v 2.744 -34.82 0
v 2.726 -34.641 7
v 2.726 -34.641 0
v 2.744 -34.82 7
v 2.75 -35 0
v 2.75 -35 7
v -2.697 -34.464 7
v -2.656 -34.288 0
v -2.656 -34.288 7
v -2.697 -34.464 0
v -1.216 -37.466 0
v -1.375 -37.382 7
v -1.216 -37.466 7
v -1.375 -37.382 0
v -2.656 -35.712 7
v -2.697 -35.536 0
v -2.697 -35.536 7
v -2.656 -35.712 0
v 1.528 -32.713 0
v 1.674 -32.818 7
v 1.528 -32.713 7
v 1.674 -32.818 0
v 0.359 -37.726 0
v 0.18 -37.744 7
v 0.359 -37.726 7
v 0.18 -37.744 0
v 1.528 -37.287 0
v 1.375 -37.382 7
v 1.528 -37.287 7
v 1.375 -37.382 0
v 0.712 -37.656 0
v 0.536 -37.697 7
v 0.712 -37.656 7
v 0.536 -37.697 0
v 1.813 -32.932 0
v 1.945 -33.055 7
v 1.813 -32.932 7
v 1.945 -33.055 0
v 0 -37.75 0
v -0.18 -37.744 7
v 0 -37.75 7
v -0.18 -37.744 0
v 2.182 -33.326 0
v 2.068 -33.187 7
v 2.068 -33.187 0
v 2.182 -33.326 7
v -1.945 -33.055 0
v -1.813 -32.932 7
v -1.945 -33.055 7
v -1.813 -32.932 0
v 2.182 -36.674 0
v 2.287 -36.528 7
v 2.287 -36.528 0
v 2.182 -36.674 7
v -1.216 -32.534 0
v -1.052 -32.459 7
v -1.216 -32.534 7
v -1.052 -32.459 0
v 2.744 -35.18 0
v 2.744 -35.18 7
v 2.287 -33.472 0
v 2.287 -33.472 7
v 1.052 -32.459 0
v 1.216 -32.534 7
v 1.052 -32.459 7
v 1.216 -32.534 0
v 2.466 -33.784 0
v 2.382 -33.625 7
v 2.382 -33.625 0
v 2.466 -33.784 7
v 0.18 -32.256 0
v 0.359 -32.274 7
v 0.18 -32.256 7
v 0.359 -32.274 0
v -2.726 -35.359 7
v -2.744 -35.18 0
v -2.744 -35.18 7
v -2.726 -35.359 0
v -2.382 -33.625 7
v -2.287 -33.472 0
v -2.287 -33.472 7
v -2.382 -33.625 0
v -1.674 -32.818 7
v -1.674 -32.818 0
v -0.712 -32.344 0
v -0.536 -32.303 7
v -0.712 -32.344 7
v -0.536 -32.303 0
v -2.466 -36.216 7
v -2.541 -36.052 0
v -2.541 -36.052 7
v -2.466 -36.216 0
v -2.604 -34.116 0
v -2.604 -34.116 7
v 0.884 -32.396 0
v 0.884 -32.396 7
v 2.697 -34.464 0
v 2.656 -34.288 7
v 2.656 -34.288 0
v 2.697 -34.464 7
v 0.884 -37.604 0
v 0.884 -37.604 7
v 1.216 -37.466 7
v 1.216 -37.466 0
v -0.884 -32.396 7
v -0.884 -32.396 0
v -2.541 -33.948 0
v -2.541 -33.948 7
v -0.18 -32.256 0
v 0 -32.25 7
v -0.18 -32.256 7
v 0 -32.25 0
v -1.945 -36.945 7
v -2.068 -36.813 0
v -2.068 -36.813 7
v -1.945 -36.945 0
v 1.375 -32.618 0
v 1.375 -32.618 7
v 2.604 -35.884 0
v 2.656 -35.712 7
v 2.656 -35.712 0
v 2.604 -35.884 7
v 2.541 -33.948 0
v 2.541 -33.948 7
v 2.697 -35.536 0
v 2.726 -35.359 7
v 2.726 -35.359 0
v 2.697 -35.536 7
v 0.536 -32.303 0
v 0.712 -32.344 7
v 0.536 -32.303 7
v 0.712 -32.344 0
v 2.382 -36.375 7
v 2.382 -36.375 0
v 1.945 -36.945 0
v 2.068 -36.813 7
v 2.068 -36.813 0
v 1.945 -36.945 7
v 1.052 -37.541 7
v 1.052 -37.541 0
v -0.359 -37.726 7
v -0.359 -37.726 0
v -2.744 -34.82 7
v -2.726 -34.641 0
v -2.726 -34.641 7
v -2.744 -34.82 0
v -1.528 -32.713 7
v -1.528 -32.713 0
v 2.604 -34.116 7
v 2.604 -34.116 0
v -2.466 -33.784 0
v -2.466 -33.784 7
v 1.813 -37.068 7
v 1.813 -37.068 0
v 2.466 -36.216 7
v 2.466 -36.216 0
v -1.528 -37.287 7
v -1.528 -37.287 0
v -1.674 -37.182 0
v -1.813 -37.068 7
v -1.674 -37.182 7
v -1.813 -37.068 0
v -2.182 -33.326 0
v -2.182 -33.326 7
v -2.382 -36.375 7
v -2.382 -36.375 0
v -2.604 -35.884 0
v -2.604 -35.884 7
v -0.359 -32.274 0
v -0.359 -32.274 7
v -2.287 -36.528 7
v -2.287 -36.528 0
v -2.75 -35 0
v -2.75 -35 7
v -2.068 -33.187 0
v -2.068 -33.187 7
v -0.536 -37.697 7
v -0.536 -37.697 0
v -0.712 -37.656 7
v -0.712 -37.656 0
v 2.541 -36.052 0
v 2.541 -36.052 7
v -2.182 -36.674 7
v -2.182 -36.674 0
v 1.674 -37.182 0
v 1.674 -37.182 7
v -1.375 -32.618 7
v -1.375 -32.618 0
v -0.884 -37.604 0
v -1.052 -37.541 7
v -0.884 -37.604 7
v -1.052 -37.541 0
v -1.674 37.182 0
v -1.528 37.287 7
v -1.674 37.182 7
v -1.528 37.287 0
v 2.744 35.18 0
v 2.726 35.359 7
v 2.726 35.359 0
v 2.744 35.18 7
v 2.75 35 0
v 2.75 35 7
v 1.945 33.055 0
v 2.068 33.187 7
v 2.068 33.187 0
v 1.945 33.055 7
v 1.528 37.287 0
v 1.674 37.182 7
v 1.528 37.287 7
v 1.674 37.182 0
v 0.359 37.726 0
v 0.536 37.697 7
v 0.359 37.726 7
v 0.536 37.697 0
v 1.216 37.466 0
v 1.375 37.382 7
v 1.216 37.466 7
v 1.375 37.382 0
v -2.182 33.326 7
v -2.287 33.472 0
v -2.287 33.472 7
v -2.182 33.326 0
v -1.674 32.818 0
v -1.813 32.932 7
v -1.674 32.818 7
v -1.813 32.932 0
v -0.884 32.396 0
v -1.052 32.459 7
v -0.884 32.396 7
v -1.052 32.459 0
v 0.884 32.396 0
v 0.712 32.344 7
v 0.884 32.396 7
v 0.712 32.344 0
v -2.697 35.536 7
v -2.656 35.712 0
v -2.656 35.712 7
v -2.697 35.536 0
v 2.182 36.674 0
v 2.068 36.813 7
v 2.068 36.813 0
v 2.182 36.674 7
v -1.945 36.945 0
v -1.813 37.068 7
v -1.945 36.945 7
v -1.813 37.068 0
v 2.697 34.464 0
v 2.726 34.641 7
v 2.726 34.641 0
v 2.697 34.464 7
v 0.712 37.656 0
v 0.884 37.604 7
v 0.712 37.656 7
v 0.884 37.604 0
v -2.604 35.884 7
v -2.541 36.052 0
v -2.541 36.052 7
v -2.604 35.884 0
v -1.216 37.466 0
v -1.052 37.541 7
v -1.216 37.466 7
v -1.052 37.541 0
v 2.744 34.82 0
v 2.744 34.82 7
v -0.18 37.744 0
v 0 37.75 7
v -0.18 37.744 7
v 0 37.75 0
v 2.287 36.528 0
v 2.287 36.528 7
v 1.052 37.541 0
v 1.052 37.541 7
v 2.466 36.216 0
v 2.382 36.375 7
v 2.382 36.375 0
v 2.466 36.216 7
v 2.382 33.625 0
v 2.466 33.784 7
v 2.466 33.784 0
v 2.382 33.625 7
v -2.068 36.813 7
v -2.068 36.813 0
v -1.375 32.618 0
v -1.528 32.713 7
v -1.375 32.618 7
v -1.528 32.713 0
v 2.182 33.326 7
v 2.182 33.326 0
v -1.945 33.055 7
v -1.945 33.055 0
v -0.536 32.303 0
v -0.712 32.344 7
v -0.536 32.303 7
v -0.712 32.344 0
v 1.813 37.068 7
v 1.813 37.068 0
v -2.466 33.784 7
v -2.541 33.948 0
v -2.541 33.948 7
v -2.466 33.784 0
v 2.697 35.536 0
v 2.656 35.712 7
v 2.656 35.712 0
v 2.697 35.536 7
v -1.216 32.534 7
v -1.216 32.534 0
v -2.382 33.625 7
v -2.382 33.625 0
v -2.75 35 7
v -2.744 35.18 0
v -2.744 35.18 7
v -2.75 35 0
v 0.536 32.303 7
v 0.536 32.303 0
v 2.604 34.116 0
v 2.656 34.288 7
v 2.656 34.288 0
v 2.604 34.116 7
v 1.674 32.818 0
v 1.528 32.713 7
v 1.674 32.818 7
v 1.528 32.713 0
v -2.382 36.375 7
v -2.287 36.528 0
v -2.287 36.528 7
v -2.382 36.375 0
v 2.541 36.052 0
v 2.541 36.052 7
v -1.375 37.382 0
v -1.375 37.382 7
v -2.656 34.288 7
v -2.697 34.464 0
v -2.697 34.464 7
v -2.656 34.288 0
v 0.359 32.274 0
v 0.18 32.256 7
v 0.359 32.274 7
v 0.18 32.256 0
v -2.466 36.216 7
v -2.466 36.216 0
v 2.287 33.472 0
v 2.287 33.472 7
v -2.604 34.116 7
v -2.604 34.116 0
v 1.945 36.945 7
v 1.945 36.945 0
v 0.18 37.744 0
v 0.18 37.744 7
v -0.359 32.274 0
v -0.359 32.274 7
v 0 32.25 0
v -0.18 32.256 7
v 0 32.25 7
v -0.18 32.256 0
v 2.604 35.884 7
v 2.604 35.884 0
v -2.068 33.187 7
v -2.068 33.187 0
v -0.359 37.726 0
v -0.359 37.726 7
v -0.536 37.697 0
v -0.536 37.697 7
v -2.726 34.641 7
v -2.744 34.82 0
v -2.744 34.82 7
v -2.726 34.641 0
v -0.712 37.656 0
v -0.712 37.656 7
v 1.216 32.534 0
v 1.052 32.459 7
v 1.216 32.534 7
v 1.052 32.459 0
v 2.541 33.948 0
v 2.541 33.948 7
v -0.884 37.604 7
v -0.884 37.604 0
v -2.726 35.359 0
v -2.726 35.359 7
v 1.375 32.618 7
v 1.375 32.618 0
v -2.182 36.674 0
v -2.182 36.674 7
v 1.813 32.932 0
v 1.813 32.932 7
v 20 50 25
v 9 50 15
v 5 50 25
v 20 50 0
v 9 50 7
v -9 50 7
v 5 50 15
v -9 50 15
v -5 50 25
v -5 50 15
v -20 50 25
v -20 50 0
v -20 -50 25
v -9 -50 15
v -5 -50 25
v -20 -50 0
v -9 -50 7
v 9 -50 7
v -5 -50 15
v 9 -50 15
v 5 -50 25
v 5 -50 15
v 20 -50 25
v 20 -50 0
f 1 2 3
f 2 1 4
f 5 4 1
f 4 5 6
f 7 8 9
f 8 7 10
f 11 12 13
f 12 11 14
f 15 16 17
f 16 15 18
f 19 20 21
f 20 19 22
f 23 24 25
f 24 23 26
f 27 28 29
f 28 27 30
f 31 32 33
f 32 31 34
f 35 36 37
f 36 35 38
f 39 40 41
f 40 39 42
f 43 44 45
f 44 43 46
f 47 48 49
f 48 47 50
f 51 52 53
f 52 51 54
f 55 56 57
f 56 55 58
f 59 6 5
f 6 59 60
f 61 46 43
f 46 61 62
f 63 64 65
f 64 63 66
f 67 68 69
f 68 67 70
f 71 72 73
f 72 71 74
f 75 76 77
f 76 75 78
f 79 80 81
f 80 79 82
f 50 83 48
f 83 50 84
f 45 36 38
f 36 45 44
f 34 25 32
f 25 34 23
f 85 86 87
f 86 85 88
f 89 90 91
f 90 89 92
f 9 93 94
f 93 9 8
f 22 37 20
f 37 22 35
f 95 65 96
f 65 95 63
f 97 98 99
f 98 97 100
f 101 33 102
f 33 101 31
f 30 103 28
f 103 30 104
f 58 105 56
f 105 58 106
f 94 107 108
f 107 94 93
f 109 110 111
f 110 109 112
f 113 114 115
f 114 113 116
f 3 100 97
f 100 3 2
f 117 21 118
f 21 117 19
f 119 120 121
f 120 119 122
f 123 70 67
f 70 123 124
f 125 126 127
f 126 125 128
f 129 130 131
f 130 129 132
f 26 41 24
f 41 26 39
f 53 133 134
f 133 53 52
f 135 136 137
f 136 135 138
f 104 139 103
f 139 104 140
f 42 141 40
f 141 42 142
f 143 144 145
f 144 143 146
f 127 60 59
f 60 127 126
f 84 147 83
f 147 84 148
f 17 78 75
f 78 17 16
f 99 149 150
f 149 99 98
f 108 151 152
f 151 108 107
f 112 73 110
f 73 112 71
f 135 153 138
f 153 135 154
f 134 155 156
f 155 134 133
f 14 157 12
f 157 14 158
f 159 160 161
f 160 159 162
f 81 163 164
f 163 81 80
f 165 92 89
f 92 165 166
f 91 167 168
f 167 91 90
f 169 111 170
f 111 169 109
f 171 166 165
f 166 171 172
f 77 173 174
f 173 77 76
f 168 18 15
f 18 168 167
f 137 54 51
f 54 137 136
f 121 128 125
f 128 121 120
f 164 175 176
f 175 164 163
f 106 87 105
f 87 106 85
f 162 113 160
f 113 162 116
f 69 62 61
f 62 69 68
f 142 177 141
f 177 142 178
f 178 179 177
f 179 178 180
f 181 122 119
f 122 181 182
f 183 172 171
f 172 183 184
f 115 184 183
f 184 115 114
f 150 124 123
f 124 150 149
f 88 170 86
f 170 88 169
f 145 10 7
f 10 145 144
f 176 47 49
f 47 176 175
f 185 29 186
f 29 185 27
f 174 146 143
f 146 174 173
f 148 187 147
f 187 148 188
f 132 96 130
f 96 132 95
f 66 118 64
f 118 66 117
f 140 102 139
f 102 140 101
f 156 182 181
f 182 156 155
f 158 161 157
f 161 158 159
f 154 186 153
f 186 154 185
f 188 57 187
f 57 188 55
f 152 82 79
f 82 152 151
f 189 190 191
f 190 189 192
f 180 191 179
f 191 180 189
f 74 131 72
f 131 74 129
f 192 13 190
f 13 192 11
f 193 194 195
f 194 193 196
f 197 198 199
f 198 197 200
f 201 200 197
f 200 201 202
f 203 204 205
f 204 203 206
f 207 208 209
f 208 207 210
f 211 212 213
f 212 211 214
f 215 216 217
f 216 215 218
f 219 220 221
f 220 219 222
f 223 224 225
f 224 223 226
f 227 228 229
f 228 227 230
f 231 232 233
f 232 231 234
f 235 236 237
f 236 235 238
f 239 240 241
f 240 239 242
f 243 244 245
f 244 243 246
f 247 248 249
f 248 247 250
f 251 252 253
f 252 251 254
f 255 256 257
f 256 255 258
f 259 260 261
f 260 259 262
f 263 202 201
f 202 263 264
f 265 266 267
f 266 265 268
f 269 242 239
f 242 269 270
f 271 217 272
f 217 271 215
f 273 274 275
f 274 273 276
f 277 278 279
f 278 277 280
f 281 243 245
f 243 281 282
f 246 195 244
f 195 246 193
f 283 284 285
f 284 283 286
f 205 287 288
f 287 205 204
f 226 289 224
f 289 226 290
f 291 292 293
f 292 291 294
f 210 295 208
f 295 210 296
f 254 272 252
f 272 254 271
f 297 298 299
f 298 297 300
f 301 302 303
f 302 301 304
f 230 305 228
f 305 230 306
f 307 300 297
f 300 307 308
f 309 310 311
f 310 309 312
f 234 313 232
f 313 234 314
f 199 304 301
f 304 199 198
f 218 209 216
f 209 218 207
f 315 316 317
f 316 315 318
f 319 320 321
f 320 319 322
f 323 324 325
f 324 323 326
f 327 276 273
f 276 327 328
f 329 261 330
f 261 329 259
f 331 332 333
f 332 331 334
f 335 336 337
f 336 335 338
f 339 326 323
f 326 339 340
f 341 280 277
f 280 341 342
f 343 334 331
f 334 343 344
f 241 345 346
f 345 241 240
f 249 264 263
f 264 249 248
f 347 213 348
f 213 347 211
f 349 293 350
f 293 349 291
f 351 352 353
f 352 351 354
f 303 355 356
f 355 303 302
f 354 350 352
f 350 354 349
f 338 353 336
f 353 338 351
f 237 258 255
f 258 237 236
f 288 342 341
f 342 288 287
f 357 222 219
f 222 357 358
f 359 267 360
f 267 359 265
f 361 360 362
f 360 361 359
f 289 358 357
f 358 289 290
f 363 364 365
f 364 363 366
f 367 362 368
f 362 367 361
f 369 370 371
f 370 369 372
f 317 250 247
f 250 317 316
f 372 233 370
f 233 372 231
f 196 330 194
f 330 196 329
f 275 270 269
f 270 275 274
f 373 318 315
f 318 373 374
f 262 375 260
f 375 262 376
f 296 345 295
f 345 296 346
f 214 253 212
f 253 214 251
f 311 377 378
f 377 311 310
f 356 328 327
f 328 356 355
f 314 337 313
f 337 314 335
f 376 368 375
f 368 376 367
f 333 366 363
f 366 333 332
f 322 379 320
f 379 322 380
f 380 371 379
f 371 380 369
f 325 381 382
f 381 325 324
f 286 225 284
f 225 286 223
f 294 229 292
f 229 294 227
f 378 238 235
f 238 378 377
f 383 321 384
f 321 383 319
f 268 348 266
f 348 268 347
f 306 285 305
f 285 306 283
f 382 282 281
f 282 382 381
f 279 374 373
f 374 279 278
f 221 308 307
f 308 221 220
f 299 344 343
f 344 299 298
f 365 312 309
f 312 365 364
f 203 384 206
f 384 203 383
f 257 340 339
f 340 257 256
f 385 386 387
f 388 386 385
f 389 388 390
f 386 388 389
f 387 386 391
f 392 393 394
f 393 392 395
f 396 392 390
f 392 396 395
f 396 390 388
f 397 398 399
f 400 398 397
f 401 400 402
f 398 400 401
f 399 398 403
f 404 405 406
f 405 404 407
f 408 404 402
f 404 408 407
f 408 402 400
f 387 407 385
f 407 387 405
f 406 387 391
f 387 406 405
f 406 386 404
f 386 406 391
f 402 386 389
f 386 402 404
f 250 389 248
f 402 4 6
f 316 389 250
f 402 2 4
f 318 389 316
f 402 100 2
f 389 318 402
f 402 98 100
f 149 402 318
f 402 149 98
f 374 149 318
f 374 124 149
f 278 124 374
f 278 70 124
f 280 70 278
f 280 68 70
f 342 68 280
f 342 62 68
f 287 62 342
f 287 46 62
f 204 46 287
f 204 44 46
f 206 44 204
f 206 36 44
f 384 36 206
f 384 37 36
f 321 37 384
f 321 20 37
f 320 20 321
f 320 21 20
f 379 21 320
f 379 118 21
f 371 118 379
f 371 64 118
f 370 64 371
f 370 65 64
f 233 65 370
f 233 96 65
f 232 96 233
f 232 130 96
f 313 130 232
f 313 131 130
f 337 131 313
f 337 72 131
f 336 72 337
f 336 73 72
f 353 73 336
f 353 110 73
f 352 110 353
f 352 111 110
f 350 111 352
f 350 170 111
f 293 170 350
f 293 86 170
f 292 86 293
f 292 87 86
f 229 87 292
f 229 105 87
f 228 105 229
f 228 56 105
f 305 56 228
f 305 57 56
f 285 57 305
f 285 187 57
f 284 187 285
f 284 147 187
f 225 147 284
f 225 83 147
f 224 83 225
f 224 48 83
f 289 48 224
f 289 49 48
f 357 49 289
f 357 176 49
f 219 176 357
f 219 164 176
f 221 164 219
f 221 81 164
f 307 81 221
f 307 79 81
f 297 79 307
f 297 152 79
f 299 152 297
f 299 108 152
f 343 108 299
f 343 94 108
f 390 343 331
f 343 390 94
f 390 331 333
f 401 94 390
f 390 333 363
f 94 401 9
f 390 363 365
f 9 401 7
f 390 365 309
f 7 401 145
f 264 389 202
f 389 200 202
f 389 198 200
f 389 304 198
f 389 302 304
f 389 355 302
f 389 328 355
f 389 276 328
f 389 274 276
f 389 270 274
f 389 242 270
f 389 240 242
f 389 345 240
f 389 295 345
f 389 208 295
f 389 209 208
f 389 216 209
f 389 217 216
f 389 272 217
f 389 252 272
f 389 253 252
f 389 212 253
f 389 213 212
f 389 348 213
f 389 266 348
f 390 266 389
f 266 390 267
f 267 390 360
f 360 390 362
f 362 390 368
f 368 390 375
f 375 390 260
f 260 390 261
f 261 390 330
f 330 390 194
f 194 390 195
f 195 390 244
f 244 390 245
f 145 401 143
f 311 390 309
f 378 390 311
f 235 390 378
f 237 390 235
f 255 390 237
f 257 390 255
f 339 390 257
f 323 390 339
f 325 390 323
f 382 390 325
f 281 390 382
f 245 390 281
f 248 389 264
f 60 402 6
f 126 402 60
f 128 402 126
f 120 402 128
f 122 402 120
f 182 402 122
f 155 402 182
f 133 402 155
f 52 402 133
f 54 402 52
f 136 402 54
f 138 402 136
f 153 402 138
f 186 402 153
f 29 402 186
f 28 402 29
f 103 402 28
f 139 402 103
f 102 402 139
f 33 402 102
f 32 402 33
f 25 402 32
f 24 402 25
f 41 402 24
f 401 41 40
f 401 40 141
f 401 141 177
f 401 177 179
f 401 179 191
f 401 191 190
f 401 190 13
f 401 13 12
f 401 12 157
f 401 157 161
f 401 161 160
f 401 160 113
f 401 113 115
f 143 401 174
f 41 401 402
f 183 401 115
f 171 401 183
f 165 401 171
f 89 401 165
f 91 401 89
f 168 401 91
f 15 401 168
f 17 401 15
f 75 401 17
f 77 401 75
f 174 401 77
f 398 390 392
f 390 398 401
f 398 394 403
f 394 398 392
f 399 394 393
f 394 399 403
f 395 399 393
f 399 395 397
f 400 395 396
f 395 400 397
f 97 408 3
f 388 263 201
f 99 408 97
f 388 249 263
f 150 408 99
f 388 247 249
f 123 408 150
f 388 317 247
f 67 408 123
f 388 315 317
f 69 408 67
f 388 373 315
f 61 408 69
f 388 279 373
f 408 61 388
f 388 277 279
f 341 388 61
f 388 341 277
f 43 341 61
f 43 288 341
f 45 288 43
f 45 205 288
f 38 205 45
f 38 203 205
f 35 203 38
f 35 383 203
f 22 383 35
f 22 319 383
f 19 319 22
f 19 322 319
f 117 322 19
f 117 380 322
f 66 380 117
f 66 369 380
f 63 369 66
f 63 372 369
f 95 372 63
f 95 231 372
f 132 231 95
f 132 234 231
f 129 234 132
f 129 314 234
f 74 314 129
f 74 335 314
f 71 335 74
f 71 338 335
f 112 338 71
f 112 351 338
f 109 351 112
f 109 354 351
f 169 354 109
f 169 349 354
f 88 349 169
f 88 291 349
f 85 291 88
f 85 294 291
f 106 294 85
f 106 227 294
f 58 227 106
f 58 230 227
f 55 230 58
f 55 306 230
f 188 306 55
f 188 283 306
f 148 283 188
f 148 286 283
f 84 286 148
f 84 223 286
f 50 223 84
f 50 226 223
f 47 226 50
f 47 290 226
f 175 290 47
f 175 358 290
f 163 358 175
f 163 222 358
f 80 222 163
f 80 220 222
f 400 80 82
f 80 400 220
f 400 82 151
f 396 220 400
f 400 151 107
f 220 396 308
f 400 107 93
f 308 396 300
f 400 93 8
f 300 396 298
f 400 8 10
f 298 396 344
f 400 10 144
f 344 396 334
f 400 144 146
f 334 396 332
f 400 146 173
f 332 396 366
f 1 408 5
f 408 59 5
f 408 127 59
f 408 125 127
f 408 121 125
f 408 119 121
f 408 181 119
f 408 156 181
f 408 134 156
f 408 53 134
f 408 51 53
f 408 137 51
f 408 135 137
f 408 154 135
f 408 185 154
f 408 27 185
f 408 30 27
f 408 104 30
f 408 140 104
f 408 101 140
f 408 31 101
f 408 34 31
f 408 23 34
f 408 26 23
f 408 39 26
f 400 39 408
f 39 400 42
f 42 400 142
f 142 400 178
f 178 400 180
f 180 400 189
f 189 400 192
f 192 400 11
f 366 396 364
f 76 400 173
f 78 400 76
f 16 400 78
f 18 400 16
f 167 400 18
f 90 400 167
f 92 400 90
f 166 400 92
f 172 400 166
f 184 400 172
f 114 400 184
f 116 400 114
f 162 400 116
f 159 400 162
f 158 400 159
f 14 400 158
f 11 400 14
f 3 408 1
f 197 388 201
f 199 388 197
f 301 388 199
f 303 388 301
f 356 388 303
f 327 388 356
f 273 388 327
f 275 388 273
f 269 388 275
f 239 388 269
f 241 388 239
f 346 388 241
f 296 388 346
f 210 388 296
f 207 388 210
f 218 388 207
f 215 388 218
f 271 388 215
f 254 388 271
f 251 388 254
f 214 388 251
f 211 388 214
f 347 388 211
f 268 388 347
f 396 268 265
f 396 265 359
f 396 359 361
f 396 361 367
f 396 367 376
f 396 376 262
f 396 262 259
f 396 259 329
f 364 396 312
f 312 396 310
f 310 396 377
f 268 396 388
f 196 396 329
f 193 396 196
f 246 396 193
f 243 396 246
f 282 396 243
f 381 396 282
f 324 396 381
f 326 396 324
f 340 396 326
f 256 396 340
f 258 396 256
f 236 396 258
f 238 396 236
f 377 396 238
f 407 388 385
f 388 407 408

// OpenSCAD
// t3-007 T-slot rail
$fn = 96;
rail_length = 100;
rail_width = 40;
rail_height = 25;
neck_width = 10;
slot_width = 18;     // chamber width
chamber_bottom = 7;
chamber_top = 15;
hole_diameter = 5.5;
hole_y = 35;

difference() {
    translate([0, rail_length / 2, 0]) rotate([90, 0, 0])
        linear_extrude(rail_length)
            difference() {
                translate([-rail_width / 2, 0]) square([rail_width, rail_height]);
                translate([-neck_width / 2, chamber_top - 0.01]) square([neck_width, rail_height - chamber_top + 1]);
                translate([-slot_width / 2, chamber_bottom]) square([slot_width, chamber_top - chamber_bottom]);
            }
    for (s = [-1, 1])
        translate([0, s * hole_y, -1]) cylinder(d = hole_diameter, h = chamber_bottom + 2);
}
